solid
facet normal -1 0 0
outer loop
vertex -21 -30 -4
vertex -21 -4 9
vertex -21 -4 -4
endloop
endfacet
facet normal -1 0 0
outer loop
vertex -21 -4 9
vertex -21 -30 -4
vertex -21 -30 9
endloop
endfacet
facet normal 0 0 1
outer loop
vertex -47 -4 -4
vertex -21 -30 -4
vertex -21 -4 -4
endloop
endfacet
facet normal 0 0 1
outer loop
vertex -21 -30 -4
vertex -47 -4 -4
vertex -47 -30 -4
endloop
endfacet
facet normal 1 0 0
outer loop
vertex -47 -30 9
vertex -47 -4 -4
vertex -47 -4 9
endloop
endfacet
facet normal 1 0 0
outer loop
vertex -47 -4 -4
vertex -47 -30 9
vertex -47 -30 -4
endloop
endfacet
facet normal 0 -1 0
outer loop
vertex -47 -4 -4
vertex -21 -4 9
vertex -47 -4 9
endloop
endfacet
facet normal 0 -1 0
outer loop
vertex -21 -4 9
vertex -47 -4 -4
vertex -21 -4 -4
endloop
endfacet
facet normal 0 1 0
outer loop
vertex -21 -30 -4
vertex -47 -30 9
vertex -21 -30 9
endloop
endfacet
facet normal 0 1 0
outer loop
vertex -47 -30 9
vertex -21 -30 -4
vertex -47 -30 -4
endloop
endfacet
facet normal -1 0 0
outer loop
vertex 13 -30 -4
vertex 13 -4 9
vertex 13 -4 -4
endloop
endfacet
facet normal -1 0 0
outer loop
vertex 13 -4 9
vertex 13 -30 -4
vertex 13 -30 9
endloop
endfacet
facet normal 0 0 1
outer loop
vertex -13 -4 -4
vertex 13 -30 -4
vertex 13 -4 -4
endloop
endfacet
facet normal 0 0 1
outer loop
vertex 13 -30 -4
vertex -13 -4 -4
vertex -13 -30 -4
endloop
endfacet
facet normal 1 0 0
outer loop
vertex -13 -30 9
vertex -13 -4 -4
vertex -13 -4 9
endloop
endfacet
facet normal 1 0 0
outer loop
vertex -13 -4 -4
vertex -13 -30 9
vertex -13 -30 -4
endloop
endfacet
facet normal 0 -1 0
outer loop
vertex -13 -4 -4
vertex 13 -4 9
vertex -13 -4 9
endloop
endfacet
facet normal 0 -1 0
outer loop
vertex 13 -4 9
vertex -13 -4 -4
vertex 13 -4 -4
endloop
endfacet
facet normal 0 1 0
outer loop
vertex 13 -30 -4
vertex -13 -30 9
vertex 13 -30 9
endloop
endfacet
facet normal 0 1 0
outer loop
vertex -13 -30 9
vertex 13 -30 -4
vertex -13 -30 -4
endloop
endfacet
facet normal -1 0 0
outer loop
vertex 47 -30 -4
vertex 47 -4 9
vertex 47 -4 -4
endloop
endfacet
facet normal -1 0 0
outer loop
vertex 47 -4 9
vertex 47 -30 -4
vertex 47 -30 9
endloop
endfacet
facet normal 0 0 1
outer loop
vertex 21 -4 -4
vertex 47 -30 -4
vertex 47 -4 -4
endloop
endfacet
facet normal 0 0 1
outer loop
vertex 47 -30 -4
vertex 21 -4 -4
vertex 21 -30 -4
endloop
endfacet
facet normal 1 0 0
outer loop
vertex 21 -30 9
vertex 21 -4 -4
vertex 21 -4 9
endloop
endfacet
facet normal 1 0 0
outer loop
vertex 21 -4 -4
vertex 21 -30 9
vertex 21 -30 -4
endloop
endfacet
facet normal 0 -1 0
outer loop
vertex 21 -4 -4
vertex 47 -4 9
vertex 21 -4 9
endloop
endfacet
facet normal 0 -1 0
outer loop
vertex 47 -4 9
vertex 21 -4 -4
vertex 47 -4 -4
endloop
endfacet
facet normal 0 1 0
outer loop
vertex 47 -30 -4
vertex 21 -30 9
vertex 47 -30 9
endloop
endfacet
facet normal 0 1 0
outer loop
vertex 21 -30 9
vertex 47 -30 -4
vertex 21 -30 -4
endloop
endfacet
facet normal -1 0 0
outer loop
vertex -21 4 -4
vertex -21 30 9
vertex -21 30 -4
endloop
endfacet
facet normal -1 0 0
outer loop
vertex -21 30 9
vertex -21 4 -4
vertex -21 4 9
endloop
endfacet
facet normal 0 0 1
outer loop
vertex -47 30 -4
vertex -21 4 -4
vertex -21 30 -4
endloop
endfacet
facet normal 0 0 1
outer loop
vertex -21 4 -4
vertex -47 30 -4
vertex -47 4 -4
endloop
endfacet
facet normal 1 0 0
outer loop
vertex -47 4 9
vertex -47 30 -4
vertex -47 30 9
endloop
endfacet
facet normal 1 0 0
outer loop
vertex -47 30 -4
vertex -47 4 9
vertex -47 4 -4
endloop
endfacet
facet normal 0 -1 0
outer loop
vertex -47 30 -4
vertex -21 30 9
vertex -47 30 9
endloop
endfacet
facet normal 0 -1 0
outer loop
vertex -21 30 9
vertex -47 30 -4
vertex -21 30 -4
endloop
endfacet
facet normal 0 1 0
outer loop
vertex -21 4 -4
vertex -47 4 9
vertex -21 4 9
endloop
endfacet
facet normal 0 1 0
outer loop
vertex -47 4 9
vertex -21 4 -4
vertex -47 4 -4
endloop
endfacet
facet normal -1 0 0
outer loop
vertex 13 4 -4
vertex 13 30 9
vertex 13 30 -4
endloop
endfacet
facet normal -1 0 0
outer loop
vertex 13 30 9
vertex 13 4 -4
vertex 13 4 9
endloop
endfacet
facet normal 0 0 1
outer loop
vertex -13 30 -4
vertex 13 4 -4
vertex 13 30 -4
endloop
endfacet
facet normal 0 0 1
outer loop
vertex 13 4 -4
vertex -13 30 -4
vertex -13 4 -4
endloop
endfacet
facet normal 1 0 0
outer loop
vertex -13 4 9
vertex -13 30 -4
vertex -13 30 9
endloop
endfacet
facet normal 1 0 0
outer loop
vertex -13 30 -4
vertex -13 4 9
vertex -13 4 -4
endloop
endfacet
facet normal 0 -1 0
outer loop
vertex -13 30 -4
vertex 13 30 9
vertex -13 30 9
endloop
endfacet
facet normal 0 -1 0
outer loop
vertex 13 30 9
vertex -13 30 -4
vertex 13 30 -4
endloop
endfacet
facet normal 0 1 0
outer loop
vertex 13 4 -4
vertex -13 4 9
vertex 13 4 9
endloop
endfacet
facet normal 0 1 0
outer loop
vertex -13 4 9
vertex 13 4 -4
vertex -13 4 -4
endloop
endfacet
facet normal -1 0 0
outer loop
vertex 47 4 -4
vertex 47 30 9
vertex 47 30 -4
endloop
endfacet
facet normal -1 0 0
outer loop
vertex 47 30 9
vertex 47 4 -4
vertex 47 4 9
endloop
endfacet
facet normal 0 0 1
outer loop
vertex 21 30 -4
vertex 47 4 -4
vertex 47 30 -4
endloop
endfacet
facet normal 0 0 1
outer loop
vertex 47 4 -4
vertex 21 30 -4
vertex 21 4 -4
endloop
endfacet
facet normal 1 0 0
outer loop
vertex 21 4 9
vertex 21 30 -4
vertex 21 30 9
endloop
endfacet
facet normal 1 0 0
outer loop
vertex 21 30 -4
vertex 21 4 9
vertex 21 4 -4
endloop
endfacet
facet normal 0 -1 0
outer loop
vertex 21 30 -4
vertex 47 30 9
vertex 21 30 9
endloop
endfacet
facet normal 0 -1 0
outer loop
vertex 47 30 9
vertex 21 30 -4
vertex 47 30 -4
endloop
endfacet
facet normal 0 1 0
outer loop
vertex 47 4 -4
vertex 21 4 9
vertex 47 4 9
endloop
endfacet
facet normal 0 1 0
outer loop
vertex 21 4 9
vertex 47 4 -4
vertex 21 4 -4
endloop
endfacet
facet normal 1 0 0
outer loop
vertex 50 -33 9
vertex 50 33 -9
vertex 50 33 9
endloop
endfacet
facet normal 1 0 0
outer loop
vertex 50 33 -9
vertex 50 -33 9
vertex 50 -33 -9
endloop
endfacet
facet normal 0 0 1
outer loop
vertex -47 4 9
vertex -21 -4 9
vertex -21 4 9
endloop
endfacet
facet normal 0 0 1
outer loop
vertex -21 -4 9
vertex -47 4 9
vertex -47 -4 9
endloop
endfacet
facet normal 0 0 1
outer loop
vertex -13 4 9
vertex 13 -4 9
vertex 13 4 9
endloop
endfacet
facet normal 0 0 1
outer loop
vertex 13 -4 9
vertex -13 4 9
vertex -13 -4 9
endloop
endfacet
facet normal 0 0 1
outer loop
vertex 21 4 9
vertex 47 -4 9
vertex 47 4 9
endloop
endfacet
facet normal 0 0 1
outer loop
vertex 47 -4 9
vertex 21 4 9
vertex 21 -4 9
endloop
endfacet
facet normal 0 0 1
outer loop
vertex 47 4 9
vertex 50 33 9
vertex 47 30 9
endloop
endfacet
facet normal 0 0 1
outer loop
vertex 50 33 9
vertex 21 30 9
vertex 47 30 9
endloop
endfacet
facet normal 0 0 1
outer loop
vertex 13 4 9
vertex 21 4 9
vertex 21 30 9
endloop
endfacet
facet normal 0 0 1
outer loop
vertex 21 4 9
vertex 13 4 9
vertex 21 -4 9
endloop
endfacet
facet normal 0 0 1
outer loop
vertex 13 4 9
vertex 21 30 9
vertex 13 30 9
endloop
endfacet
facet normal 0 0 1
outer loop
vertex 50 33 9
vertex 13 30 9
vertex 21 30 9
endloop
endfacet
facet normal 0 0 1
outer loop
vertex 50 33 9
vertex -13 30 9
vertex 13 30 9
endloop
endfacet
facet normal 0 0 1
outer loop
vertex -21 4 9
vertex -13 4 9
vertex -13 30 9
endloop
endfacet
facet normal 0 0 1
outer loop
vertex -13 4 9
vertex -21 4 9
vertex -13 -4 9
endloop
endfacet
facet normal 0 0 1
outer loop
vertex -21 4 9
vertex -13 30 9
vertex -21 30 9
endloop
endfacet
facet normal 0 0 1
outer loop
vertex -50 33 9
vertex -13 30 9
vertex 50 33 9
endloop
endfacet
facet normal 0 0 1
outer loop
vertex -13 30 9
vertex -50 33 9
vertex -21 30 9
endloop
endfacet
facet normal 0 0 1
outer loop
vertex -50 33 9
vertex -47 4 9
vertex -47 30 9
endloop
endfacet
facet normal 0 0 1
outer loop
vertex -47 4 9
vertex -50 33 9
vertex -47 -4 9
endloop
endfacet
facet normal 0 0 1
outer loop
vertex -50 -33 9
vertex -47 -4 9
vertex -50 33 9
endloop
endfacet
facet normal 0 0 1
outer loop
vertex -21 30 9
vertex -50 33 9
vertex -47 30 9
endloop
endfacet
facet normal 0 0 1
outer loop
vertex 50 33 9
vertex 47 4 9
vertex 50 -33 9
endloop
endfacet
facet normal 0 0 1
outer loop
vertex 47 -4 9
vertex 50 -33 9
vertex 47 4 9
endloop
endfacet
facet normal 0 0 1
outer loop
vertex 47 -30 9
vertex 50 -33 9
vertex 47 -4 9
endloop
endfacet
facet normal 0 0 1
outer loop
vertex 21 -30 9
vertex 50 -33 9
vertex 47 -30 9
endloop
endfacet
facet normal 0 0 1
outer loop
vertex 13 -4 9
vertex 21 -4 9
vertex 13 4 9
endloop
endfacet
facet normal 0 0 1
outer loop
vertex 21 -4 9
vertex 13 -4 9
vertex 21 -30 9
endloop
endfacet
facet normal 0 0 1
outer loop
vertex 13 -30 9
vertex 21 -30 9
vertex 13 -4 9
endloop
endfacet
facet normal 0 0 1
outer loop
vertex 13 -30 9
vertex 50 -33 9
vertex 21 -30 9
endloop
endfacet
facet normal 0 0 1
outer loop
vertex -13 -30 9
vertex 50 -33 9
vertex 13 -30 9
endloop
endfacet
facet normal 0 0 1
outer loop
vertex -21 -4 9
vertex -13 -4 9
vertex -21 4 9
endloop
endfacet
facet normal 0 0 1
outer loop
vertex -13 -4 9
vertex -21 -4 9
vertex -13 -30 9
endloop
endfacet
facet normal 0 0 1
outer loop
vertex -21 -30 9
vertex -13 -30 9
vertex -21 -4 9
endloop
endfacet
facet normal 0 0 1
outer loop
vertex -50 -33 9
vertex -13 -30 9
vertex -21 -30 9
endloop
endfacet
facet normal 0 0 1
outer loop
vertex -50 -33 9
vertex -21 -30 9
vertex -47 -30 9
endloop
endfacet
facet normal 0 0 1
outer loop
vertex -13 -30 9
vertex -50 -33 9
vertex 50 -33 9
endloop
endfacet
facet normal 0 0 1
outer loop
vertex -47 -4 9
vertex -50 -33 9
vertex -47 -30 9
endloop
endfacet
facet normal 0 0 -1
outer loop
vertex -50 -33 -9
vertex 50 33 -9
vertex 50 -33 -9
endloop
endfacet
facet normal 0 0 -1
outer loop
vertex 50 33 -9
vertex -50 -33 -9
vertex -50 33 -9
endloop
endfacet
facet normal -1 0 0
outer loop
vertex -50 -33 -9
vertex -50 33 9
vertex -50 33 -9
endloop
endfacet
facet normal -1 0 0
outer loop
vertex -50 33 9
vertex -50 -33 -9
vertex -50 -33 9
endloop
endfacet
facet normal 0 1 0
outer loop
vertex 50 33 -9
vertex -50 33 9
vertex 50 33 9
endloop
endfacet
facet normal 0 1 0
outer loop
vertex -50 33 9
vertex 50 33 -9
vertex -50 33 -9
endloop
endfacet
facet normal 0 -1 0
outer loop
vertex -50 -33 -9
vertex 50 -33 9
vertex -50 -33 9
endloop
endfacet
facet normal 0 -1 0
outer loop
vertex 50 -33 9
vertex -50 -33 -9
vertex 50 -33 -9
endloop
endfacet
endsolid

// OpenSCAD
$fn = 32;

// ----------------------------------------------------------------------
// Pocket plate 100 x 66 x 18
// 2 x 3 pockets 26 mm square, 13 mm deep
// ----------------------------------------------------------------------

// --- parameters (mm) ---
thickness = 18;  // plate thickness
floor_t = 5;     // material left under each pocket
pocket = 26;     // pocket side length
pitch_x = 34;    // pocket pitch along X
pitch_y = 34;    // pocket pitch along Y
cols = 3;        // pockets per row
rows = 2;        // rows of pockets

// --- derived feature positions (mm) ---
depth = thickness - floor_t;        // = 13   pocket depth, down to the floor
span_x = (cols - 1) * pitch_x;      // = 68   distance between outer pockets
span_y = (rows - 1) * pitch_y;      // = 34   distance between outer pocket rows
origin_x = -span_x / 2;             // = -34   X of the first pocket
origin_y = -span_y / 2;             // = -17   Y of the first pocket
plate = [span_x + pocket + 6, span_y + pocket + 6, thickness];  // = [100, 66, 18]   overall size: pockets plus 3 mm of wall on each side
feature_centers = [
  [origin_x + 0 * pitch_x, origin_y + 0 * pitch_y],
  [origin_x + 1 * pitch_x, origin_y + 0 * pitch_y],
  [origin_x + 2 * pitch_x, origin_y + 0 * pitch_y],
  [origin_x + 0 * pitch_x, origin_y + 1 * pitch_y],
  [origin_x + 1 * pitch_x, origin_y + 1 * pitch_y],
  [origin_x + 2 * pitch_x, origin_y + 1 * pitch_y]
];   // pocket centres, used verbatim by the cutter loop

// plate outline, then one pocket per centre in feature_centers
difference() {
  cube(plate, center = true);
  for (centre = feature_centers)
    translate([centre[0] - pocket / 2, centre[1] - pocket / 2, plate[2] / 2 - depth])
      cube([pocket, pocket, depth + 1]);  // centred on the declared pocket centre
}
